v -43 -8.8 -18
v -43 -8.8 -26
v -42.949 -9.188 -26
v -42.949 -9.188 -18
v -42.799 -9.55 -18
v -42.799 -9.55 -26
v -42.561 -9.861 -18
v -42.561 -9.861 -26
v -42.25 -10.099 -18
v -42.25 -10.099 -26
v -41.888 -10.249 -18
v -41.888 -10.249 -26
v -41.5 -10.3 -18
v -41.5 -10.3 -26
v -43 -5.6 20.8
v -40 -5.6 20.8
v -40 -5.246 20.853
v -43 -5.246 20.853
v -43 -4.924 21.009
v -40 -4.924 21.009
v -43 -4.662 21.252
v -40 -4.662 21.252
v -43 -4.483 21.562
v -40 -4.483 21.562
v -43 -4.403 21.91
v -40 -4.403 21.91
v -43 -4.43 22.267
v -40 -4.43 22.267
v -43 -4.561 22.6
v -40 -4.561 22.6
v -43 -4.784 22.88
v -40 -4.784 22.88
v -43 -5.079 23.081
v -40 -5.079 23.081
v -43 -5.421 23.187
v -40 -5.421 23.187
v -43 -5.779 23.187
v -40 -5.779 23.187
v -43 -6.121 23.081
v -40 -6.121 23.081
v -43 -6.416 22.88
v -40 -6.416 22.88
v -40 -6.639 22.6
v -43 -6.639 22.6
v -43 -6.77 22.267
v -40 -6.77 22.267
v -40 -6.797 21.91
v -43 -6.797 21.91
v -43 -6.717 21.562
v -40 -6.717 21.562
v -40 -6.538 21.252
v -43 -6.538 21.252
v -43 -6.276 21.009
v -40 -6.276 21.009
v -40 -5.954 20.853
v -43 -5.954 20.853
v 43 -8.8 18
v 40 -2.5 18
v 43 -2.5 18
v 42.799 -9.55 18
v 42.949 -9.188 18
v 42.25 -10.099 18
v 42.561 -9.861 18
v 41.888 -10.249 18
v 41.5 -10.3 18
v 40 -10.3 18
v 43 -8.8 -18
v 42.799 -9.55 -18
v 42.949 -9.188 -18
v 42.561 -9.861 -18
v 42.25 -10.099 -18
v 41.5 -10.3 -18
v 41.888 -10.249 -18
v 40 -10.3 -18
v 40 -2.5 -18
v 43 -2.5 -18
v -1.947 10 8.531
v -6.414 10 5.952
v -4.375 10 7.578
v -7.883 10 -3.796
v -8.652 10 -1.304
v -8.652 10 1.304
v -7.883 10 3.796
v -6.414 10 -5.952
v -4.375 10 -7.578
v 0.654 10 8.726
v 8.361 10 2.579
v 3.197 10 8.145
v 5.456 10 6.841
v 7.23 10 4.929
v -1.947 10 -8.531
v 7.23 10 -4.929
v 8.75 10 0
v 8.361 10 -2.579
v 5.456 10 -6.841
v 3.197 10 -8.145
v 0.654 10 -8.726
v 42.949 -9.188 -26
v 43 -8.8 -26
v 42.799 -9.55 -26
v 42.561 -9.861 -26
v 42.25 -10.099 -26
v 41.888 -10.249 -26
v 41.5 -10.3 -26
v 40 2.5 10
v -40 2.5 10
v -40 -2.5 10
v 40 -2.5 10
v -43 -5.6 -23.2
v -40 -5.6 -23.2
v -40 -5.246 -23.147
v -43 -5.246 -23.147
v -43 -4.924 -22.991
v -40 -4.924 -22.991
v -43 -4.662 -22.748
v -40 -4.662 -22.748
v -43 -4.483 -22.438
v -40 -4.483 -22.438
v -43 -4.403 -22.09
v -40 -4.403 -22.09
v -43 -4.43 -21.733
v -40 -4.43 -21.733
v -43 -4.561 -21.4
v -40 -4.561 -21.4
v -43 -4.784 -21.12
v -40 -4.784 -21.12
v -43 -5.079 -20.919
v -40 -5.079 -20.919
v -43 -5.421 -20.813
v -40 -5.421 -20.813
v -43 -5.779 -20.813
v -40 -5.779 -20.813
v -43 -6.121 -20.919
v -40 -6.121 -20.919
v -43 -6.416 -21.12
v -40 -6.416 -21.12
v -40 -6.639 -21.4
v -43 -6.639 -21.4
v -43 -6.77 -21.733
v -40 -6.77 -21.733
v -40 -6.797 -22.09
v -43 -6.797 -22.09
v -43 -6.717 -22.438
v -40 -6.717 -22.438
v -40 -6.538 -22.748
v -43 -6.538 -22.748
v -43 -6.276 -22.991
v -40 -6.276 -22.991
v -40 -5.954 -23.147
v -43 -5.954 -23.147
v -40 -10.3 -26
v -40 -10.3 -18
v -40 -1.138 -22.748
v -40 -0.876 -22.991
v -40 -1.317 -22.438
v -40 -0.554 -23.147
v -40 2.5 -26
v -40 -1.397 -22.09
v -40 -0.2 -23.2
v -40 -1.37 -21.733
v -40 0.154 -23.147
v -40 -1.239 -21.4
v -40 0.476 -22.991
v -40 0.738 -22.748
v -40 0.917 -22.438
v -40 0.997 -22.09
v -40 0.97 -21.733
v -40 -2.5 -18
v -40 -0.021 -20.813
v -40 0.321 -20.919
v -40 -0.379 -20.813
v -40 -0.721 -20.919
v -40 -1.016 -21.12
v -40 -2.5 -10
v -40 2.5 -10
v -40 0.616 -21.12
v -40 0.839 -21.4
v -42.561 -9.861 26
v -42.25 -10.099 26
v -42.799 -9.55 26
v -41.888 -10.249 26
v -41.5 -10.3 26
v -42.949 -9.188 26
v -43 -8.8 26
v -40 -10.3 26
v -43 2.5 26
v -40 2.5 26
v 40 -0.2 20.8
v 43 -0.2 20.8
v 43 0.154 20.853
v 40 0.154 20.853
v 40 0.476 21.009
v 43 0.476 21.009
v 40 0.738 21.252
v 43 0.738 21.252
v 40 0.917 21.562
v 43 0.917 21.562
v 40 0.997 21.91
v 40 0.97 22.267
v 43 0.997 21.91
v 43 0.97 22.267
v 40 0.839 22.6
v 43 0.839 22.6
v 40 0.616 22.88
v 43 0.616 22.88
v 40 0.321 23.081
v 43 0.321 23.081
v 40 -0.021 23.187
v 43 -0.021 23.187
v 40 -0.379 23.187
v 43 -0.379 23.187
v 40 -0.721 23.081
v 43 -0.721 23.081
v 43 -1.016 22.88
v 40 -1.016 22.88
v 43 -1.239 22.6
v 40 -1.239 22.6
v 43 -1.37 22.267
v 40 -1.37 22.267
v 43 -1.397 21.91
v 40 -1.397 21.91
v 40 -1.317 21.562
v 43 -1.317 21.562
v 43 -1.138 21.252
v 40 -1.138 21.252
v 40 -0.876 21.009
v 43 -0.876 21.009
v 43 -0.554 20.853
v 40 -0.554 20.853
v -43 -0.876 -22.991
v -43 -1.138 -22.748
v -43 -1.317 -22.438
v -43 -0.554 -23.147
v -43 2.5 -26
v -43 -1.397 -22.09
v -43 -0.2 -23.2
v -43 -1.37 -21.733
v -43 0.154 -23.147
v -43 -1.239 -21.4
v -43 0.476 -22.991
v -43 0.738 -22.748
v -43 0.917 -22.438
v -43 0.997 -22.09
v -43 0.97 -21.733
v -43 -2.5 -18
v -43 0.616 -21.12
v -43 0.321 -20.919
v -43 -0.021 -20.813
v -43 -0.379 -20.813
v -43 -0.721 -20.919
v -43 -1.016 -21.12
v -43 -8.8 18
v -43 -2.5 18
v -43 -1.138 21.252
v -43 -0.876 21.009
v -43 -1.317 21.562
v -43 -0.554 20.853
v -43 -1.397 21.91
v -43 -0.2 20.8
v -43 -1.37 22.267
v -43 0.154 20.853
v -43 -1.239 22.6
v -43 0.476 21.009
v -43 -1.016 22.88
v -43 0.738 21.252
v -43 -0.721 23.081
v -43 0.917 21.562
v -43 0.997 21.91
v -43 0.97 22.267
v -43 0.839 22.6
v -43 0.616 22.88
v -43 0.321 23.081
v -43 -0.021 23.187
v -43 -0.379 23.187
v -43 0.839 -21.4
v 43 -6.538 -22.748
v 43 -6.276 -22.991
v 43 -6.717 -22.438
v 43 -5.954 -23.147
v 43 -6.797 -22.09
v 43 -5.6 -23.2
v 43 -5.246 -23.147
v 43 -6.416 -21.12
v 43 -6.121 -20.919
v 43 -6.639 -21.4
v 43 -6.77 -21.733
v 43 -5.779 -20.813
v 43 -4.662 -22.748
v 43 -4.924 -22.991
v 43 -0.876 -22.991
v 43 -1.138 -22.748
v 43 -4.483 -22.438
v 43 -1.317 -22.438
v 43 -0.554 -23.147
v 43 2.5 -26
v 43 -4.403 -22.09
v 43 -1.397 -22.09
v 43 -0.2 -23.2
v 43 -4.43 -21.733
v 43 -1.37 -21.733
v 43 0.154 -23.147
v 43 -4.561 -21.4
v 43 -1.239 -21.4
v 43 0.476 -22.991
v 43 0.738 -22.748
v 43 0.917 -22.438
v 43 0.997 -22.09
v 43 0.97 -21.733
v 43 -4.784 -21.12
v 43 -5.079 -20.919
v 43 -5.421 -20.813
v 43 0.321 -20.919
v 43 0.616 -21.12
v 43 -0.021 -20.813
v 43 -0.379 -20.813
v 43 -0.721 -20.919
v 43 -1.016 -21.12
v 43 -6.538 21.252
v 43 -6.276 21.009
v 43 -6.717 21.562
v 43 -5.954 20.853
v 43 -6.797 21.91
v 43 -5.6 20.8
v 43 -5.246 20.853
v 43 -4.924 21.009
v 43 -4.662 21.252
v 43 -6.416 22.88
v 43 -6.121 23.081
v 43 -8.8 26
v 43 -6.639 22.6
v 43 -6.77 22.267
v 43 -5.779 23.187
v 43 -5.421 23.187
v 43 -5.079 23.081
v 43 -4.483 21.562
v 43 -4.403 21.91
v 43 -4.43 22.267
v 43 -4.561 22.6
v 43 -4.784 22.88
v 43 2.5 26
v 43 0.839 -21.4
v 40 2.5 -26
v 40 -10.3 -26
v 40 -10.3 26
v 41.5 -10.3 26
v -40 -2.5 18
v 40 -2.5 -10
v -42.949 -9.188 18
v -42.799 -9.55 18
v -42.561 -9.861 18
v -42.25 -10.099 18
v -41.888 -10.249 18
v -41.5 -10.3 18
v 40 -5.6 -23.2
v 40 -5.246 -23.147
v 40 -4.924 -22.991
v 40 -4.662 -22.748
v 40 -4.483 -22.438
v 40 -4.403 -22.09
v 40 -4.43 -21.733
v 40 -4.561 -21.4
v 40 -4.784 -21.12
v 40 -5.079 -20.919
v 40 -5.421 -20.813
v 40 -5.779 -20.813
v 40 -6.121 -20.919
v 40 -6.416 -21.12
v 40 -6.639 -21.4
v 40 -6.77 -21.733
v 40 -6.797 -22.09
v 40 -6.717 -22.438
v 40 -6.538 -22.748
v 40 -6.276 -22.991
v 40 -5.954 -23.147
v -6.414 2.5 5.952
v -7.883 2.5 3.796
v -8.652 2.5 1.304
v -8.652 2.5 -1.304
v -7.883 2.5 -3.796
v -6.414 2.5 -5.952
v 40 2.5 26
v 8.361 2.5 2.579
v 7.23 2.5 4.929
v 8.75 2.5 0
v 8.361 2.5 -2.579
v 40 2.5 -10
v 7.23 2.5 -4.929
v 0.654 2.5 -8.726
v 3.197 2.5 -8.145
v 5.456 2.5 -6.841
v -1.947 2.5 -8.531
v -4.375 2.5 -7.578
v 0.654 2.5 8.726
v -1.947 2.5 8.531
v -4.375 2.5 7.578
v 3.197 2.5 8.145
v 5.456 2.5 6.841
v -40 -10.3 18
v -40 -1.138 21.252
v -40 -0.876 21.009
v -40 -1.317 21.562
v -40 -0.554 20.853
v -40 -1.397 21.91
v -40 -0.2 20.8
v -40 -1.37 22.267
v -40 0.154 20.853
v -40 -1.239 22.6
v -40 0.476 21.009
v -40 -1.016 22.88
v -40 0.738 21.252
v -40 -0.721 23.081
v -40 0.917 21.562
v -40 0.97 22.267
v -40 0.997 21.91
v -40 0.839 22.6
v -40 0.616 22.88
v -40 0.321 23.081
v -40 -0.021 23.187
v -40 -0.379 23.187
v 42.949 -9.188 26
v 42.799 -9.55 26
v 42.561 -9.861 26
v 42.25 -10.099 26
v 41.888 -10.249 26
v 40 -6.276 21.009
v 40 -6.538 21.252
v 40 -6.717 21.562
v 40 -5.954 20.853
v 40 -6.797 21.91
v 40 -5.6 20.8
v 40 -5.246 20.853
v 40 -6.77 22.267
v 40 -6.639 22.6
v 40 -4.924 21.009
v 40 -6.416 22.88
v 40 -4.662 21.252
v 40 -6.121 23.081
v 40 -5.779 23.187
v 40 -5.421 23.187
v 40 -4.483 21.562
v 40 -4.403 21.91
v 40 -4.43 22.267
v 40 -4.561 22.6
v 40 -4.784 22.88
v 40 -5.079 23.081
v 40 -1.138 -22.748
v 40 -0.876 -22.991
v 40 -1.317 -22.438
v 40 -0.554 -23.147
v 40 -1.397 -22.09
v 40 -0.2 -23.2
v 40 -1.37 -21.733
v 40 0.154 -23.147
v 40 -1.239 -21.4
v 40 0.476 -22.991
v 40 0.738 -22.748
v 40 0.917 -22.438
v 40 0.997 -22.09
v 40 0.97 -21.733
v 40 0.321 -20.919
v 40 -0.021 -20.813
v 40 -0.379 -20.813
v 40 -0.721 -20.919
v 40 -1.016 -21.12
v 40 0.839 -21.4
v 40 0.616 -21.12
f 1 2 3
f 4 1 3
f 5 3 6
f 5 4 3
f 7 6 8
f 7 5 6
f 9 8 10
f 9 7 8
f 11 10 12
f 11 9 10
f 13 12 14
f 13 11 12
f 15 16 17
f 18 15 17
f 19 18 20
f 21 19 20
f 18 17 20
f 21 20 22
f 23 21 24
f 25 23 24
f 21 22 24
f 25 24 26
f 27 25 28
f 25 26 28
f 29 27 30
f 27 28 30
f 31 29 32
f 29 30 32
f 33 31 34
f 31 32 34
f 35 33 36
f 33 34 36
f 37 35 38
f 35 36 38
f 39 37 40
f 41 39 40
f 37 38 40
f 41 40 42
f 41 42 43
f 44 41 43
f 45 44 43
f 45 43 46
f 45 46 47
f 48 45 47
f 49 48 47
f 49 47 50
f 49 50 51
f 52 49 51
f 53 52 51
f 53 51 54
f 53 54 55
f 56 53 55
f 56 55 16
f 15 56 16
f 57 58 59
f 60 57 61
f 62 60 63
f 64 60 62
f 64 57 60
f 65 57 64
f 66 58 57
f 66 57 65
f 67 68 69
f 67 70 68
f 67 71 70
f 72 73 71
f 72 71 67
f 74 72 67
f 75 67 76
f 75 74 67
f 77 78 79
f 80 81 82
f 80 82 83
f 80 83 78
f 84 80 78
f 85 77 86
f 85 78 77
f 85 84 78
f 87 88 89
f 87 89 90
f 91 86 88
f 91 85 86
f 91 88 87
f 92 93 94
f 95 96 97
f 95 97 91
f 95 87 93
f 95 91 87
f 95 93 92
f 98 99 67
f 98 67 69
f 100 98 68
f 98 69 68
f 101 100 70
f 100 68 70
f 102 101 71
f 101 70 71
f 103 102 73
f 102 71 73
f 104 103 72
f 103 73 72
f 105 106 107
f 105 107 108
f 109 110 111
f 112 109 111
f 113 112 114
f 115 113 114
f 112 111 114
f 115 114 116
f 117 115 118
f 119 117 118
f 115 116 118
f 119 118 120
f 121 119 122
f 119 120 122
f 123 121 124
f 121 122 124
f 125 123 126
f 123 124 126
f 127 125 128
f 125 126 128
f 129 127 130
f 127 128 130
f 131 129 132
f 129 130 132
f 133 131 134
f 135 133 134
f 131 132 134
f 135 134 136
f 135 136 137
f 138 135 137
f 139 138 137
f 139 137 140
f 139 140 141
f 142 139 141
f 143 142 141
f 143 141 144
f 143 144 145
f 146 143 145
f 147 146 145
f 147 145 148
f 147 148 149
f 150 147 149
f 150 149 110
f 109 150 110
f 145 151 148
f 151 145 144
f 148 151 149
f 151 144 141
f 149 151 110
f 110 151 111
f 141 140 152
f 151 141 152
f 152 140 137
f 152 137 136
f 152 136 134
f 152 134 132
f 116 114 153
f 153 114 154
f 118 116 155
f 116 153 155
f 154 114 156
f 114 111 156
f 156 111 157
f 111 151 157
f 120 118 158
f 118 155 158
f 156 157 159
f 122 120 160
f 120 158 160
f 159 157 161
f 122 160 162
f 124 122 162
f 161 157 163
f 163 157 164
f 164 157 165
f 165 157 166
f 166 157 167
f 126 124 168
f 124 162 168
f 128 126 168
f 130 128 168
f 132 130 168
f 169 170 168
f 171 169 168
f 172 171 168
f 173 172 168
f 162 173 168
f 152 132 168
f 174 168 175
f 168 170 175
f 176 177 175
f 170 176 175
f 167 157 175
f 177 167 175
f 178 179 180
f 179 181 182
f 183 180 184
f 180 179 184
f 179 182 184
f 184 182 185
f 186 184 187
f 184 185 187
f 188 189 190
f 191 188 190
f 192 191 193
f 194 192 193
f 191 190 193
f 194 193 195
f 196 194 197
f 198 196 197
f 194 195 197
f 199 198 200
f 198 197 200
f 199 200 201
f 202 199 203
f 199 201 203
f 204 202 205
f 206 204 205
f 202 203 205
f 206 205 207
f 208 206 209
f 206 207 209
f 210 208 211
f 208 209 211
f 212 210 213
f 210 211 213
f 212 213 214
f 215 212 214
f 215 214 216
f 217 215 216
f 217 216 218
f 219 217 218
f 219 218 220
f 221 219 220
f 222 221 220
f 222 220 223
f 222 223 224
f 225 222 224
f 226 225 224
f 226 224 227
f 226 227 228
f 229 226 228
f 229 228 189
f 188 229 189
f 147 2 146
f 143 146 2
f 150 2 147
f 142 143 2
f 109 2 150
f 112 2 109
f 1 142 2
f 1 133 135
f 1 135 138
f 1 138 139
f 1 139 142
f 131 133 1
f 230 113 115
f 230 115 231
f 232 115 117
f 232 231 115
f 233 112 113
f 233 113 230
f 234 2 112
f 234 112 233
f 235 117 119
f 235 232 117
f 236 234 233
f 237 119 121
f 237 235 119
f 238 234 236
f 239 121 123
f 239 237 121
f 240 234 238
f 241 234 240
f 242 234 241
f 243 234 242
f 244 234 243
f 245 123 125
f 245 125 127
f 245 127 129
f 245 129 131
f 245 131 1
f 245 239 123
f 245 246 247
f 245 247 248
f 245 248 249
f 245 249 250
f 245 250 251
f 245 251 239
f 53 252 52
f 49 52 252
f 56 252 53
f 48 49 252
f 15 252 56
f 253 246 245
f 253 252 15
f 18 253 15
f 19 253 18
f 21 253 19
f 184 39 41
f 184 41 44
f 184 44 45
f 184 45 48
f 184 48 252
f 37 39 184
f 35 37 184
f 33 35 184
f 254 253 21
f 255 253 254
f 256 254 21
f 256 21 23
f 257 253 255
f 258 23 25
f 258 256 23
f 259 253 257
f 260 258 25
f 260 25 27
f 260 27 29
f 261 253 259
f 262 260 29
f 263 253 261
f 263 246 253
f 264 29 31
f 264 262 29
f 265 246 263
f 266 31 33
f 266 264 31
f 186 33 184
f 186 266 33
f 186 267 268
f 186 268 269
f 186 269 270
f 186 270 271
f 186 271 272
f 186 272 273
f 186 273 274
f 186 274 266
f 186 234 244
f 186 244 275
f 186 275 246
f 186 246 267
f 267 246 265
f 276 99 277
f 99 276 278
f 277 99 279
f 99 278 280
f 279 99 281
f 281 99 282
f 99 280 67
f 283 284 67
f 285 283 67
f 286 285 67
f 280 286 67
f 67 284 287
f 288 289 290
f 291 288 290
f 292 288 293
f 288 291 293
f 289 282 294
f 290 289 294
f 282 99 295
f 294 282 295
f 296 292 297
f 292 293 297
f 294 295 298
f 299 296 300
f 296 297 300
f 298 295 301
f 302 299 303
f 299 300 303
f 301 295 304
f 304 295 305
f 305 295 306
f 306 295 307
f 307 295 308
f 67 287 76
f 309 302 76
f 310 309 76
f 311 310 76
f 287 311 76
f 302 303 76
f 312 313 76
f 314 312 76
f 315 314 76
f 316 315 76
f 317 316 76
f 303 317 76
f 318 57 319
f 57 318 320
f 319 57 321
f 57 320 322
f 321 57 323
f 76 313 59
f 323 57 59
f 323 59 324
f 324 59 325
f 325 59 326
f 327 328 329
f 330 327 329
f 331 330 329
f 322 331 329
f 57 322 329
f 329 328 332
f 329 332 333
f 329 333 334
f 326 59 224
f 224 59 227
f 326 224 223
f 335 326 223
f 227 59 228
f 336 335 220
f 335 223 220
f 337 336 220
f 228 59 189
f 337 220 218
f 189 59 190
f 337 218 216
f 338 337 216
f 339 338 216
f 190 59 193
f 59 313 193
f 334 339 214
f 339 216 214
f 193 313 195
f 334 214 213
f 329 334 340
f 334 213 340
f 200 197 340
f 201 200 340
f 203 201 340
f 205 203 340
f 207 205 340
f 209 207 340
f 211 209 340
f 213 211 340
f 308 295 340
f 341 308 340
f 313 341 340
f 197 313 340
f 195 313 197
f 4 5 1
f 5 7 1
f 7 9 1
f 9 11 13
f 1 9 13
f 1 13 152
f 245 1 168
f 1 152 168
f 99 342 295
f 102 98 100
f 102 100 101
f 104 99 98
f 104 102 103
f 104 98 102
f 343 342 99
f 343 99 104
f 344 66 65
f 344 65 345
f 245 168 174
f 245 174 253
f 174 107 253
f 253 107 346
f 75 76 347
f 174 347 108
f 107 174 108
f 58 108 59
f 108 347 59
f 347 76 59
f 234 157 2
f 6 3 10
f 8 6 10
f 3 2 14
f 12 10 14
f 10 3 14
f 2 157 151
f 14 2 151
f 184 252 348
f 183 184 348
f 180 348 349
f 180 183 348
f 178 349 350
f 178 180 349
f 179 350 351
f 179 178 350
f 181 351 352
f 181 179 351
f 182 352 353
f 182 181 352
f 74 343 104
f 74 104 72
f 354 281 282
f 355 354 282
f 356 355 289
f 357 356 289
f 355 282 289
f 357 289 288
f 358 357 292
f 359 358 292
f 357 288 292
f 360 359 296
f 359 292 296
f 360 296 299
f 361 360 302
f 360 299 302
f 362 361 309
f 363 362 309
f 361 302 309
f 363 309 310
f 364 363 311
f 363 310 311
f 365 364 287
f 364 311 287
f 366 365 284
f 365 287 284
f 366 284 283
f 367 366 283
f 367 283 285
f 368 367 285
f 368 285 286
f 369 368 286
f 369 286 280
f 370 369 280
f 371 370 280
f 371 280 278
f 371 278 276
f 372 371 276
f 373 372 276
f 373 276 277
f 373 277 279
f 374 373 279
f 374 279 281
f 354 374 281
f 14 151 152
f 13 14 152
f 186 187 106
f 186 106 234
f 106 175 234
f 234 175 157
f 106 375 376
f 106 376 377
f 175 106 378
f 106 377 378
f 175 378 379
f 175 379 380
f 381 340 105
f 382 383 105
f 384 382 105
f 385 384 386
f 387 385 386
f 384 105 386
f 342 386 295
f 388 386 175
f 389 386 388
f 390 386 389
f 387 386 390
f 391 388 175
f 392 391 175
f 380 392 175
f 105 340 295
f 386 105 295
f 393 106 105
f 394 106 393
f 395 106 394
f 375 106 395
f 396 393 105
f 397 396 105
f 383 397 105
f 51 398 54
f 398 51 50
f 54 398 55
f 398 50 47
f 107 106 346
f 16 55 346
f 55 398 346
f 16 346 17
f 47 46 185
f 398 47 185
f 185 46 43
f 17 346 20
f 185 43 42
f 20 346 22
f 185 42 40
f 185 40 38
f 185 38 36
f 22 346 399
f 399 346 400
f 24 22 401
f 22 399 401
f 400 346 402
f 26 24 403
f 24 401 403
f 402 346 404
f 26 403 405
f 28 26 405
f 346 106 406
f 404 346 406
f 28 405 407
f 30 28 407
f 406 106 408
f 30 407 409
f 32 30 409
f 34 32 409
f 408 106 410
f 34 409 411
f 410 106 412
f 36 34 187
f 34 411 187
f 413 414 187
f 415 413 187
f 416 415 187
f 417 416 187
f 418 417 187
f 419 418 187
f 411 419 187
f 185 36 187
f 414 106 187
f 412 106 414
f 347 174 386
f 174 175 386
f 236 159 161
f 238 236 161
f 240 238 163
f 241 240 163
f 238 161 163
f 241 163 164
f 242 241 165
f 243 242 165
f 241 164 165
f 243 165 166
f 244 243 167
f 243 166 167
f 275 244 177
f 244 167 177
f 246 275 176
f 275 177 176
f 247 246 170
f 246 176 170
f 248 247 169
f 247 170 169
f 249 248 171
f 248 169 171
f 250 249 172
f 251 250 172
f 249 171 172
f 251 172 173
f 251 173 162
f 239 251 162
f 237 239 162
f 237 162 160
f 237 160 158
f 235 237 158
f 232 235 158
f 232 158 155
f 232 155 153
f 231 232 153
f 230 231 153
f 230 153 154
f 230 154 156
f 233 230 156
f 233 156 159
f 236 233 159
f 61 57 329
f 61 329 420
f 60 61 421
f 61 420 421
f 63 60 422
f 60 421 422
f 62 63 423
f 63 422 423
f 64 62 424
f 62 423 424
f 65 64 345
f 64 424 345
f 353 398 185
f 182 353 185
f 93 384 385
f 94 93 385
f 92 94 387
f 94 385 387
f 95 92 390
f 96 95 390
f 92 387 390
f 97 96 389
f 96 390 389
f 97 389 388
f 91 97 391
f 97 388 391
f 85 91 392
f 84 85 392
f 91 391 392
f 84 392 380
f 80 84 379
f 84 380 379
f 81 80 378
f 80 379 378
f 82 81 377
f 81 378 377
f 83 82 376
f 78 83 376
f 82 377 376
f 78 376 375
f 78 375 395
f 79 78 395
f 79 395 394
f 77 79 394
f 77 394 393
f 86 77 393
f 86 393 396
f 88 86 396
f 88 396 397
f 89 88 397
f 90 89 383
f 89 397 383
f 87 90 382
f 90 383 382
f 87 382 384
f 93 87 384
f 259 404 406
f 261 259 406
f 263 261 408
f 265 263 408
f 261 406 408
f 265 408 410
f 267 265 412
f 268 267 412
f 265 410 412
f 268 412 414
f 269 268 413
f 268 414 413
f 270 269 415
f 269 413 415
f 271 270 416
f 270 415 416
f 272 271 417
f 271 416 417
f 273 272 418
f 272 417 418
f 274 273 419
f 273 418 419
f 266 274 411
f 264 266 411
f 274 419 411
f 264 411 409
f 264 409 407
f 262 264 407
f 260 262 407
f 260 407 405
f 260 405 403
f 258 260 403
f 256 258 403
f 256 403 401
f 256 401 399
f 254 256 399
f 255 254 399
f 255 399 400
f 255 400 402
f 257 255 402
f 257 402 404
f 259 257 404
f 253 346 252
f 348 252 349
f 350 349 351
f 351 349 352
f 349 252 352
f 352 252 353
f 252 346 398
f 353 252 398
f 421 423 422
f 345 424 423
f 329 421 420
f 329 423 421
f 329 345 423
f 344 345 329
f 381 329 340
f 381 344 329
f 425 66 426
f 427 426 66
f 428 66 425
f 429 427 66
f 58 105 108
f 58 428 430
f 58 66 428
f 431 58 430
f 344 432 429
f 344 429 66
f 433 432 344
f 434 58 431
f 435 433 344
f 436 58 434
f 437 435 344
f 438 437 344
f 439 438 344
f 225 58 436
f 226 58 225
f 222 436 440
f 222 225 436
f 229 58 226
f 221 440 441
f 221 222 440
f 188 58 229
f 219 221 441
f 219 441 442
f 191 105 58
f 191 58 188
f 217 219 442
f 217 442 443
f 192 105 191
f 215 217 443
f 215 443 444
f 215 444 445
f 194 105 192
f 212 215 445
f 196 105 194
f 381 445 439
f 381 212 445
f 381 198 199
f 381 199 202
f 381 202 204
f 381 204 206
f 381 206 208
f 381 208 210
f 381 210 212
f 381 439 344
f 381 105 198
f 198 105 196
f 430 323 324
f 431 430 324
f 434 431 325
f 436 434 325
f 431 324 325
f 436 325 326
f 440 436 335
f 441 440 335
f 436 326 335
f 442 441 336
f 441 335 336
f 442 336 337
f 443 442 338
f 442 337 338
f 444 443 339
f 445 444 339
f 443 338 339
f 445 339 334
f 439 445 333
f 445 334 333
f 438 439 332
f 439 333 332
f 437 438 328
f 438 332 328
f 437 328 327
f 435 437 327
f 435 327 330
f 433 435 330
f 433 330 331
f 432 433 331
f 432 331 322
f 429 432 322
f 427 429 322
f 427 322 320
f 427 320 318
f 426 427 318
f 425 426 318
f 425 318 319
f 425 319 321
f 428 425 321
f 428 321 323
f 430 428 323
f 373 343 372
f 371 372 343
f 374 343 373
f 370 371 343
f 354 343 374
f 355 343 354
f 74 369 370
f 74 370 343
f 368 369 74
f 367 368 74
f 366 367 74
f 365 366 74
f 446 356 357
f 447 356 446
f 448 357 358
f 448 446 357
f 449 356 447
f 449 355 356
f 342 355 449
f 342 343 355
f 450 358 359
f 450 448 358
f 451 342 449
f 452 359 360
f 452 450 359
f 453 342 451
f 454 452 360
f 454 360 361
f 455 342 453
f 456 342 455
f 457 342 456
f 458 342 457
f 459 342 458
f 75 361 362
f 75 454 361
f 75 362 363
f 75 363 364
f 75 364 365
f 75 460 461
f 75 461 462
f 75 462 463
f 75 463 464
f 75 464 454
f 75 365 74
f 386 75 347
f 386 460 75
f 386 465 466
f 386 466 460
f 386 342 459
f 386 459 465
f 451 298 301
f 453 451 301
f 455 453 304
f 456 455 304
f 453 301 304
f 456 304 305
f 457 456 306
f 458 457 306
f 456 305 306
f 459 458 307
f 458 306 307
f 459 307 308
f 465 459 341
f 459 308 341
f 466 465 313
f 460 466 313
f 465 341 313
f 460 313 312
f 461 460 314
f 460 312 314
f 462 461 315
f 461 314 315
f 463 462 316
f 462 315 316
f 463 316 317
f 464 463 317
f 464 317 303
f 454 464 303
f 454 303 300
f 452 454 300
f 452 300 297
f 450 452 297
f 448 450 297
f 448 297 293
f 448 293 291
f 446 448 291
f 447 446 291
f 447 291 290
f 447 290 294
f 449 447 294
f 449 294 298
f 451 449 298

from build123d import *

# Parameters (mm, degrees)
SKETCH1_W                = 80
SKETCH1_H                = 20
BOSS_EXTRUDE1_DEPTH      = 2.5
BOSS_EXTRUDE1_DEPTH_BACK = 2.5
BOSS_EXTRUDE2_DEPTH      = 3
FILLET1_R                = 1.5
SKETCH3_R                = 1.2
CUT_EXTRUDE1_DEPTH       = 1
CUT_EXTRUDE1_DEPTH_BACK  = 87
BOSS_EXTRUDE3_START      = 2.5
SKETCH4_R                = 8.75
BOSS_EXTRUDE3_DEPTH      = 7.5


with BuildPart() as part:
    # Sketch1 → Boss-Extrude1 (new body, two sides)
    with BuildSketch(Plane(origin=(0, 0, 0), x_dir=(1, 0, 0), z_dir=(0, 1, 0))) as boss_extrude1_sk:
        Rectangle(SKETCH1_W, SKETCH1_H)
    extrude(amount=BOSS_EXTRUDE1_DEPTH)
    extrude(boss_extrude1_sk.sketch, amount=-BOSS_EXTRUDE1_DEPTH_BACK)

    # Sketch2 → Boss-Extrude2 (add)
    with BuildSketch(Plane(origin=(40, 0, 0), x_dir=(0, 0, -1), z_dir=(1, 0, 0))):
        Polygon((-26, 2.5), (26, 2.5), (26, -10.3), (18, -10.3), (18, -2.5), (-18, -2.5), (-18, -10.3), (-26, -10.3), align=None)
    boss_extrude2 = extrude(amount=BOSS_EXTRUDE2_DEPTH)

    # Mirror2: Boss-Extrude2 across plane
    add(boss_extrude2.mirror(Plane(origin=(0, 0, 0), x_dir=(0, 0, 1), z_dir=(1, 0, 0))))

    # Fillet1
    fillet1_edges = [part.edges().sort_by_distance(p)[0] for p in [
        (43, -10.3, 22),
        (43, -10.3, -22),
        (-43, -10.3, -22),
        (-43, -10.3, 22),
    ]]
    fillet(fillet1_edges, radius=FILLET1_R)

    # Sketch3 → Cut-Extrude1 (cut, two sides)
    with BuildSketch(Plane(origin=(43, 0, 0), x_dir=(0, 0, -1), z_dir=(1, 0, 0))) as cut_extrude1_sk:
        with Locations((22, -0.2)):
            Circle(SKETCH3_R)
        with Locations((-22, -0.2)):
            Circle(SKETCH3_R)
        with Locations((-22, -5.6)):
            Circle(SKETCH3_R)
        with Locations((22, -5.6)):
            Circle(SKETCH3_R)
    extrude(amount=CUT_EXTRUDE1_DEPTH, mode=Mode.SUBTRACT)
    extrude(cut_extrude1_sk.sketch, amount=-CUT_EXTRUDE1_DEPTH_BACK, mode=Mode.SUBTRACT)

    # Sketch4 → Boss-Extrude3 (add)
    with BuildSketch(Plane(origin=(0, 0, 0), x_dir=(1, 0, 0), z_dir=(0, 1, 0)).offset(BOSS_EXTRUDE3_START)):
        Circle(SKETCH4_R)
    extrude(amount=BOSS_EXTRUDE3_DEPTH)


solid = part.part
